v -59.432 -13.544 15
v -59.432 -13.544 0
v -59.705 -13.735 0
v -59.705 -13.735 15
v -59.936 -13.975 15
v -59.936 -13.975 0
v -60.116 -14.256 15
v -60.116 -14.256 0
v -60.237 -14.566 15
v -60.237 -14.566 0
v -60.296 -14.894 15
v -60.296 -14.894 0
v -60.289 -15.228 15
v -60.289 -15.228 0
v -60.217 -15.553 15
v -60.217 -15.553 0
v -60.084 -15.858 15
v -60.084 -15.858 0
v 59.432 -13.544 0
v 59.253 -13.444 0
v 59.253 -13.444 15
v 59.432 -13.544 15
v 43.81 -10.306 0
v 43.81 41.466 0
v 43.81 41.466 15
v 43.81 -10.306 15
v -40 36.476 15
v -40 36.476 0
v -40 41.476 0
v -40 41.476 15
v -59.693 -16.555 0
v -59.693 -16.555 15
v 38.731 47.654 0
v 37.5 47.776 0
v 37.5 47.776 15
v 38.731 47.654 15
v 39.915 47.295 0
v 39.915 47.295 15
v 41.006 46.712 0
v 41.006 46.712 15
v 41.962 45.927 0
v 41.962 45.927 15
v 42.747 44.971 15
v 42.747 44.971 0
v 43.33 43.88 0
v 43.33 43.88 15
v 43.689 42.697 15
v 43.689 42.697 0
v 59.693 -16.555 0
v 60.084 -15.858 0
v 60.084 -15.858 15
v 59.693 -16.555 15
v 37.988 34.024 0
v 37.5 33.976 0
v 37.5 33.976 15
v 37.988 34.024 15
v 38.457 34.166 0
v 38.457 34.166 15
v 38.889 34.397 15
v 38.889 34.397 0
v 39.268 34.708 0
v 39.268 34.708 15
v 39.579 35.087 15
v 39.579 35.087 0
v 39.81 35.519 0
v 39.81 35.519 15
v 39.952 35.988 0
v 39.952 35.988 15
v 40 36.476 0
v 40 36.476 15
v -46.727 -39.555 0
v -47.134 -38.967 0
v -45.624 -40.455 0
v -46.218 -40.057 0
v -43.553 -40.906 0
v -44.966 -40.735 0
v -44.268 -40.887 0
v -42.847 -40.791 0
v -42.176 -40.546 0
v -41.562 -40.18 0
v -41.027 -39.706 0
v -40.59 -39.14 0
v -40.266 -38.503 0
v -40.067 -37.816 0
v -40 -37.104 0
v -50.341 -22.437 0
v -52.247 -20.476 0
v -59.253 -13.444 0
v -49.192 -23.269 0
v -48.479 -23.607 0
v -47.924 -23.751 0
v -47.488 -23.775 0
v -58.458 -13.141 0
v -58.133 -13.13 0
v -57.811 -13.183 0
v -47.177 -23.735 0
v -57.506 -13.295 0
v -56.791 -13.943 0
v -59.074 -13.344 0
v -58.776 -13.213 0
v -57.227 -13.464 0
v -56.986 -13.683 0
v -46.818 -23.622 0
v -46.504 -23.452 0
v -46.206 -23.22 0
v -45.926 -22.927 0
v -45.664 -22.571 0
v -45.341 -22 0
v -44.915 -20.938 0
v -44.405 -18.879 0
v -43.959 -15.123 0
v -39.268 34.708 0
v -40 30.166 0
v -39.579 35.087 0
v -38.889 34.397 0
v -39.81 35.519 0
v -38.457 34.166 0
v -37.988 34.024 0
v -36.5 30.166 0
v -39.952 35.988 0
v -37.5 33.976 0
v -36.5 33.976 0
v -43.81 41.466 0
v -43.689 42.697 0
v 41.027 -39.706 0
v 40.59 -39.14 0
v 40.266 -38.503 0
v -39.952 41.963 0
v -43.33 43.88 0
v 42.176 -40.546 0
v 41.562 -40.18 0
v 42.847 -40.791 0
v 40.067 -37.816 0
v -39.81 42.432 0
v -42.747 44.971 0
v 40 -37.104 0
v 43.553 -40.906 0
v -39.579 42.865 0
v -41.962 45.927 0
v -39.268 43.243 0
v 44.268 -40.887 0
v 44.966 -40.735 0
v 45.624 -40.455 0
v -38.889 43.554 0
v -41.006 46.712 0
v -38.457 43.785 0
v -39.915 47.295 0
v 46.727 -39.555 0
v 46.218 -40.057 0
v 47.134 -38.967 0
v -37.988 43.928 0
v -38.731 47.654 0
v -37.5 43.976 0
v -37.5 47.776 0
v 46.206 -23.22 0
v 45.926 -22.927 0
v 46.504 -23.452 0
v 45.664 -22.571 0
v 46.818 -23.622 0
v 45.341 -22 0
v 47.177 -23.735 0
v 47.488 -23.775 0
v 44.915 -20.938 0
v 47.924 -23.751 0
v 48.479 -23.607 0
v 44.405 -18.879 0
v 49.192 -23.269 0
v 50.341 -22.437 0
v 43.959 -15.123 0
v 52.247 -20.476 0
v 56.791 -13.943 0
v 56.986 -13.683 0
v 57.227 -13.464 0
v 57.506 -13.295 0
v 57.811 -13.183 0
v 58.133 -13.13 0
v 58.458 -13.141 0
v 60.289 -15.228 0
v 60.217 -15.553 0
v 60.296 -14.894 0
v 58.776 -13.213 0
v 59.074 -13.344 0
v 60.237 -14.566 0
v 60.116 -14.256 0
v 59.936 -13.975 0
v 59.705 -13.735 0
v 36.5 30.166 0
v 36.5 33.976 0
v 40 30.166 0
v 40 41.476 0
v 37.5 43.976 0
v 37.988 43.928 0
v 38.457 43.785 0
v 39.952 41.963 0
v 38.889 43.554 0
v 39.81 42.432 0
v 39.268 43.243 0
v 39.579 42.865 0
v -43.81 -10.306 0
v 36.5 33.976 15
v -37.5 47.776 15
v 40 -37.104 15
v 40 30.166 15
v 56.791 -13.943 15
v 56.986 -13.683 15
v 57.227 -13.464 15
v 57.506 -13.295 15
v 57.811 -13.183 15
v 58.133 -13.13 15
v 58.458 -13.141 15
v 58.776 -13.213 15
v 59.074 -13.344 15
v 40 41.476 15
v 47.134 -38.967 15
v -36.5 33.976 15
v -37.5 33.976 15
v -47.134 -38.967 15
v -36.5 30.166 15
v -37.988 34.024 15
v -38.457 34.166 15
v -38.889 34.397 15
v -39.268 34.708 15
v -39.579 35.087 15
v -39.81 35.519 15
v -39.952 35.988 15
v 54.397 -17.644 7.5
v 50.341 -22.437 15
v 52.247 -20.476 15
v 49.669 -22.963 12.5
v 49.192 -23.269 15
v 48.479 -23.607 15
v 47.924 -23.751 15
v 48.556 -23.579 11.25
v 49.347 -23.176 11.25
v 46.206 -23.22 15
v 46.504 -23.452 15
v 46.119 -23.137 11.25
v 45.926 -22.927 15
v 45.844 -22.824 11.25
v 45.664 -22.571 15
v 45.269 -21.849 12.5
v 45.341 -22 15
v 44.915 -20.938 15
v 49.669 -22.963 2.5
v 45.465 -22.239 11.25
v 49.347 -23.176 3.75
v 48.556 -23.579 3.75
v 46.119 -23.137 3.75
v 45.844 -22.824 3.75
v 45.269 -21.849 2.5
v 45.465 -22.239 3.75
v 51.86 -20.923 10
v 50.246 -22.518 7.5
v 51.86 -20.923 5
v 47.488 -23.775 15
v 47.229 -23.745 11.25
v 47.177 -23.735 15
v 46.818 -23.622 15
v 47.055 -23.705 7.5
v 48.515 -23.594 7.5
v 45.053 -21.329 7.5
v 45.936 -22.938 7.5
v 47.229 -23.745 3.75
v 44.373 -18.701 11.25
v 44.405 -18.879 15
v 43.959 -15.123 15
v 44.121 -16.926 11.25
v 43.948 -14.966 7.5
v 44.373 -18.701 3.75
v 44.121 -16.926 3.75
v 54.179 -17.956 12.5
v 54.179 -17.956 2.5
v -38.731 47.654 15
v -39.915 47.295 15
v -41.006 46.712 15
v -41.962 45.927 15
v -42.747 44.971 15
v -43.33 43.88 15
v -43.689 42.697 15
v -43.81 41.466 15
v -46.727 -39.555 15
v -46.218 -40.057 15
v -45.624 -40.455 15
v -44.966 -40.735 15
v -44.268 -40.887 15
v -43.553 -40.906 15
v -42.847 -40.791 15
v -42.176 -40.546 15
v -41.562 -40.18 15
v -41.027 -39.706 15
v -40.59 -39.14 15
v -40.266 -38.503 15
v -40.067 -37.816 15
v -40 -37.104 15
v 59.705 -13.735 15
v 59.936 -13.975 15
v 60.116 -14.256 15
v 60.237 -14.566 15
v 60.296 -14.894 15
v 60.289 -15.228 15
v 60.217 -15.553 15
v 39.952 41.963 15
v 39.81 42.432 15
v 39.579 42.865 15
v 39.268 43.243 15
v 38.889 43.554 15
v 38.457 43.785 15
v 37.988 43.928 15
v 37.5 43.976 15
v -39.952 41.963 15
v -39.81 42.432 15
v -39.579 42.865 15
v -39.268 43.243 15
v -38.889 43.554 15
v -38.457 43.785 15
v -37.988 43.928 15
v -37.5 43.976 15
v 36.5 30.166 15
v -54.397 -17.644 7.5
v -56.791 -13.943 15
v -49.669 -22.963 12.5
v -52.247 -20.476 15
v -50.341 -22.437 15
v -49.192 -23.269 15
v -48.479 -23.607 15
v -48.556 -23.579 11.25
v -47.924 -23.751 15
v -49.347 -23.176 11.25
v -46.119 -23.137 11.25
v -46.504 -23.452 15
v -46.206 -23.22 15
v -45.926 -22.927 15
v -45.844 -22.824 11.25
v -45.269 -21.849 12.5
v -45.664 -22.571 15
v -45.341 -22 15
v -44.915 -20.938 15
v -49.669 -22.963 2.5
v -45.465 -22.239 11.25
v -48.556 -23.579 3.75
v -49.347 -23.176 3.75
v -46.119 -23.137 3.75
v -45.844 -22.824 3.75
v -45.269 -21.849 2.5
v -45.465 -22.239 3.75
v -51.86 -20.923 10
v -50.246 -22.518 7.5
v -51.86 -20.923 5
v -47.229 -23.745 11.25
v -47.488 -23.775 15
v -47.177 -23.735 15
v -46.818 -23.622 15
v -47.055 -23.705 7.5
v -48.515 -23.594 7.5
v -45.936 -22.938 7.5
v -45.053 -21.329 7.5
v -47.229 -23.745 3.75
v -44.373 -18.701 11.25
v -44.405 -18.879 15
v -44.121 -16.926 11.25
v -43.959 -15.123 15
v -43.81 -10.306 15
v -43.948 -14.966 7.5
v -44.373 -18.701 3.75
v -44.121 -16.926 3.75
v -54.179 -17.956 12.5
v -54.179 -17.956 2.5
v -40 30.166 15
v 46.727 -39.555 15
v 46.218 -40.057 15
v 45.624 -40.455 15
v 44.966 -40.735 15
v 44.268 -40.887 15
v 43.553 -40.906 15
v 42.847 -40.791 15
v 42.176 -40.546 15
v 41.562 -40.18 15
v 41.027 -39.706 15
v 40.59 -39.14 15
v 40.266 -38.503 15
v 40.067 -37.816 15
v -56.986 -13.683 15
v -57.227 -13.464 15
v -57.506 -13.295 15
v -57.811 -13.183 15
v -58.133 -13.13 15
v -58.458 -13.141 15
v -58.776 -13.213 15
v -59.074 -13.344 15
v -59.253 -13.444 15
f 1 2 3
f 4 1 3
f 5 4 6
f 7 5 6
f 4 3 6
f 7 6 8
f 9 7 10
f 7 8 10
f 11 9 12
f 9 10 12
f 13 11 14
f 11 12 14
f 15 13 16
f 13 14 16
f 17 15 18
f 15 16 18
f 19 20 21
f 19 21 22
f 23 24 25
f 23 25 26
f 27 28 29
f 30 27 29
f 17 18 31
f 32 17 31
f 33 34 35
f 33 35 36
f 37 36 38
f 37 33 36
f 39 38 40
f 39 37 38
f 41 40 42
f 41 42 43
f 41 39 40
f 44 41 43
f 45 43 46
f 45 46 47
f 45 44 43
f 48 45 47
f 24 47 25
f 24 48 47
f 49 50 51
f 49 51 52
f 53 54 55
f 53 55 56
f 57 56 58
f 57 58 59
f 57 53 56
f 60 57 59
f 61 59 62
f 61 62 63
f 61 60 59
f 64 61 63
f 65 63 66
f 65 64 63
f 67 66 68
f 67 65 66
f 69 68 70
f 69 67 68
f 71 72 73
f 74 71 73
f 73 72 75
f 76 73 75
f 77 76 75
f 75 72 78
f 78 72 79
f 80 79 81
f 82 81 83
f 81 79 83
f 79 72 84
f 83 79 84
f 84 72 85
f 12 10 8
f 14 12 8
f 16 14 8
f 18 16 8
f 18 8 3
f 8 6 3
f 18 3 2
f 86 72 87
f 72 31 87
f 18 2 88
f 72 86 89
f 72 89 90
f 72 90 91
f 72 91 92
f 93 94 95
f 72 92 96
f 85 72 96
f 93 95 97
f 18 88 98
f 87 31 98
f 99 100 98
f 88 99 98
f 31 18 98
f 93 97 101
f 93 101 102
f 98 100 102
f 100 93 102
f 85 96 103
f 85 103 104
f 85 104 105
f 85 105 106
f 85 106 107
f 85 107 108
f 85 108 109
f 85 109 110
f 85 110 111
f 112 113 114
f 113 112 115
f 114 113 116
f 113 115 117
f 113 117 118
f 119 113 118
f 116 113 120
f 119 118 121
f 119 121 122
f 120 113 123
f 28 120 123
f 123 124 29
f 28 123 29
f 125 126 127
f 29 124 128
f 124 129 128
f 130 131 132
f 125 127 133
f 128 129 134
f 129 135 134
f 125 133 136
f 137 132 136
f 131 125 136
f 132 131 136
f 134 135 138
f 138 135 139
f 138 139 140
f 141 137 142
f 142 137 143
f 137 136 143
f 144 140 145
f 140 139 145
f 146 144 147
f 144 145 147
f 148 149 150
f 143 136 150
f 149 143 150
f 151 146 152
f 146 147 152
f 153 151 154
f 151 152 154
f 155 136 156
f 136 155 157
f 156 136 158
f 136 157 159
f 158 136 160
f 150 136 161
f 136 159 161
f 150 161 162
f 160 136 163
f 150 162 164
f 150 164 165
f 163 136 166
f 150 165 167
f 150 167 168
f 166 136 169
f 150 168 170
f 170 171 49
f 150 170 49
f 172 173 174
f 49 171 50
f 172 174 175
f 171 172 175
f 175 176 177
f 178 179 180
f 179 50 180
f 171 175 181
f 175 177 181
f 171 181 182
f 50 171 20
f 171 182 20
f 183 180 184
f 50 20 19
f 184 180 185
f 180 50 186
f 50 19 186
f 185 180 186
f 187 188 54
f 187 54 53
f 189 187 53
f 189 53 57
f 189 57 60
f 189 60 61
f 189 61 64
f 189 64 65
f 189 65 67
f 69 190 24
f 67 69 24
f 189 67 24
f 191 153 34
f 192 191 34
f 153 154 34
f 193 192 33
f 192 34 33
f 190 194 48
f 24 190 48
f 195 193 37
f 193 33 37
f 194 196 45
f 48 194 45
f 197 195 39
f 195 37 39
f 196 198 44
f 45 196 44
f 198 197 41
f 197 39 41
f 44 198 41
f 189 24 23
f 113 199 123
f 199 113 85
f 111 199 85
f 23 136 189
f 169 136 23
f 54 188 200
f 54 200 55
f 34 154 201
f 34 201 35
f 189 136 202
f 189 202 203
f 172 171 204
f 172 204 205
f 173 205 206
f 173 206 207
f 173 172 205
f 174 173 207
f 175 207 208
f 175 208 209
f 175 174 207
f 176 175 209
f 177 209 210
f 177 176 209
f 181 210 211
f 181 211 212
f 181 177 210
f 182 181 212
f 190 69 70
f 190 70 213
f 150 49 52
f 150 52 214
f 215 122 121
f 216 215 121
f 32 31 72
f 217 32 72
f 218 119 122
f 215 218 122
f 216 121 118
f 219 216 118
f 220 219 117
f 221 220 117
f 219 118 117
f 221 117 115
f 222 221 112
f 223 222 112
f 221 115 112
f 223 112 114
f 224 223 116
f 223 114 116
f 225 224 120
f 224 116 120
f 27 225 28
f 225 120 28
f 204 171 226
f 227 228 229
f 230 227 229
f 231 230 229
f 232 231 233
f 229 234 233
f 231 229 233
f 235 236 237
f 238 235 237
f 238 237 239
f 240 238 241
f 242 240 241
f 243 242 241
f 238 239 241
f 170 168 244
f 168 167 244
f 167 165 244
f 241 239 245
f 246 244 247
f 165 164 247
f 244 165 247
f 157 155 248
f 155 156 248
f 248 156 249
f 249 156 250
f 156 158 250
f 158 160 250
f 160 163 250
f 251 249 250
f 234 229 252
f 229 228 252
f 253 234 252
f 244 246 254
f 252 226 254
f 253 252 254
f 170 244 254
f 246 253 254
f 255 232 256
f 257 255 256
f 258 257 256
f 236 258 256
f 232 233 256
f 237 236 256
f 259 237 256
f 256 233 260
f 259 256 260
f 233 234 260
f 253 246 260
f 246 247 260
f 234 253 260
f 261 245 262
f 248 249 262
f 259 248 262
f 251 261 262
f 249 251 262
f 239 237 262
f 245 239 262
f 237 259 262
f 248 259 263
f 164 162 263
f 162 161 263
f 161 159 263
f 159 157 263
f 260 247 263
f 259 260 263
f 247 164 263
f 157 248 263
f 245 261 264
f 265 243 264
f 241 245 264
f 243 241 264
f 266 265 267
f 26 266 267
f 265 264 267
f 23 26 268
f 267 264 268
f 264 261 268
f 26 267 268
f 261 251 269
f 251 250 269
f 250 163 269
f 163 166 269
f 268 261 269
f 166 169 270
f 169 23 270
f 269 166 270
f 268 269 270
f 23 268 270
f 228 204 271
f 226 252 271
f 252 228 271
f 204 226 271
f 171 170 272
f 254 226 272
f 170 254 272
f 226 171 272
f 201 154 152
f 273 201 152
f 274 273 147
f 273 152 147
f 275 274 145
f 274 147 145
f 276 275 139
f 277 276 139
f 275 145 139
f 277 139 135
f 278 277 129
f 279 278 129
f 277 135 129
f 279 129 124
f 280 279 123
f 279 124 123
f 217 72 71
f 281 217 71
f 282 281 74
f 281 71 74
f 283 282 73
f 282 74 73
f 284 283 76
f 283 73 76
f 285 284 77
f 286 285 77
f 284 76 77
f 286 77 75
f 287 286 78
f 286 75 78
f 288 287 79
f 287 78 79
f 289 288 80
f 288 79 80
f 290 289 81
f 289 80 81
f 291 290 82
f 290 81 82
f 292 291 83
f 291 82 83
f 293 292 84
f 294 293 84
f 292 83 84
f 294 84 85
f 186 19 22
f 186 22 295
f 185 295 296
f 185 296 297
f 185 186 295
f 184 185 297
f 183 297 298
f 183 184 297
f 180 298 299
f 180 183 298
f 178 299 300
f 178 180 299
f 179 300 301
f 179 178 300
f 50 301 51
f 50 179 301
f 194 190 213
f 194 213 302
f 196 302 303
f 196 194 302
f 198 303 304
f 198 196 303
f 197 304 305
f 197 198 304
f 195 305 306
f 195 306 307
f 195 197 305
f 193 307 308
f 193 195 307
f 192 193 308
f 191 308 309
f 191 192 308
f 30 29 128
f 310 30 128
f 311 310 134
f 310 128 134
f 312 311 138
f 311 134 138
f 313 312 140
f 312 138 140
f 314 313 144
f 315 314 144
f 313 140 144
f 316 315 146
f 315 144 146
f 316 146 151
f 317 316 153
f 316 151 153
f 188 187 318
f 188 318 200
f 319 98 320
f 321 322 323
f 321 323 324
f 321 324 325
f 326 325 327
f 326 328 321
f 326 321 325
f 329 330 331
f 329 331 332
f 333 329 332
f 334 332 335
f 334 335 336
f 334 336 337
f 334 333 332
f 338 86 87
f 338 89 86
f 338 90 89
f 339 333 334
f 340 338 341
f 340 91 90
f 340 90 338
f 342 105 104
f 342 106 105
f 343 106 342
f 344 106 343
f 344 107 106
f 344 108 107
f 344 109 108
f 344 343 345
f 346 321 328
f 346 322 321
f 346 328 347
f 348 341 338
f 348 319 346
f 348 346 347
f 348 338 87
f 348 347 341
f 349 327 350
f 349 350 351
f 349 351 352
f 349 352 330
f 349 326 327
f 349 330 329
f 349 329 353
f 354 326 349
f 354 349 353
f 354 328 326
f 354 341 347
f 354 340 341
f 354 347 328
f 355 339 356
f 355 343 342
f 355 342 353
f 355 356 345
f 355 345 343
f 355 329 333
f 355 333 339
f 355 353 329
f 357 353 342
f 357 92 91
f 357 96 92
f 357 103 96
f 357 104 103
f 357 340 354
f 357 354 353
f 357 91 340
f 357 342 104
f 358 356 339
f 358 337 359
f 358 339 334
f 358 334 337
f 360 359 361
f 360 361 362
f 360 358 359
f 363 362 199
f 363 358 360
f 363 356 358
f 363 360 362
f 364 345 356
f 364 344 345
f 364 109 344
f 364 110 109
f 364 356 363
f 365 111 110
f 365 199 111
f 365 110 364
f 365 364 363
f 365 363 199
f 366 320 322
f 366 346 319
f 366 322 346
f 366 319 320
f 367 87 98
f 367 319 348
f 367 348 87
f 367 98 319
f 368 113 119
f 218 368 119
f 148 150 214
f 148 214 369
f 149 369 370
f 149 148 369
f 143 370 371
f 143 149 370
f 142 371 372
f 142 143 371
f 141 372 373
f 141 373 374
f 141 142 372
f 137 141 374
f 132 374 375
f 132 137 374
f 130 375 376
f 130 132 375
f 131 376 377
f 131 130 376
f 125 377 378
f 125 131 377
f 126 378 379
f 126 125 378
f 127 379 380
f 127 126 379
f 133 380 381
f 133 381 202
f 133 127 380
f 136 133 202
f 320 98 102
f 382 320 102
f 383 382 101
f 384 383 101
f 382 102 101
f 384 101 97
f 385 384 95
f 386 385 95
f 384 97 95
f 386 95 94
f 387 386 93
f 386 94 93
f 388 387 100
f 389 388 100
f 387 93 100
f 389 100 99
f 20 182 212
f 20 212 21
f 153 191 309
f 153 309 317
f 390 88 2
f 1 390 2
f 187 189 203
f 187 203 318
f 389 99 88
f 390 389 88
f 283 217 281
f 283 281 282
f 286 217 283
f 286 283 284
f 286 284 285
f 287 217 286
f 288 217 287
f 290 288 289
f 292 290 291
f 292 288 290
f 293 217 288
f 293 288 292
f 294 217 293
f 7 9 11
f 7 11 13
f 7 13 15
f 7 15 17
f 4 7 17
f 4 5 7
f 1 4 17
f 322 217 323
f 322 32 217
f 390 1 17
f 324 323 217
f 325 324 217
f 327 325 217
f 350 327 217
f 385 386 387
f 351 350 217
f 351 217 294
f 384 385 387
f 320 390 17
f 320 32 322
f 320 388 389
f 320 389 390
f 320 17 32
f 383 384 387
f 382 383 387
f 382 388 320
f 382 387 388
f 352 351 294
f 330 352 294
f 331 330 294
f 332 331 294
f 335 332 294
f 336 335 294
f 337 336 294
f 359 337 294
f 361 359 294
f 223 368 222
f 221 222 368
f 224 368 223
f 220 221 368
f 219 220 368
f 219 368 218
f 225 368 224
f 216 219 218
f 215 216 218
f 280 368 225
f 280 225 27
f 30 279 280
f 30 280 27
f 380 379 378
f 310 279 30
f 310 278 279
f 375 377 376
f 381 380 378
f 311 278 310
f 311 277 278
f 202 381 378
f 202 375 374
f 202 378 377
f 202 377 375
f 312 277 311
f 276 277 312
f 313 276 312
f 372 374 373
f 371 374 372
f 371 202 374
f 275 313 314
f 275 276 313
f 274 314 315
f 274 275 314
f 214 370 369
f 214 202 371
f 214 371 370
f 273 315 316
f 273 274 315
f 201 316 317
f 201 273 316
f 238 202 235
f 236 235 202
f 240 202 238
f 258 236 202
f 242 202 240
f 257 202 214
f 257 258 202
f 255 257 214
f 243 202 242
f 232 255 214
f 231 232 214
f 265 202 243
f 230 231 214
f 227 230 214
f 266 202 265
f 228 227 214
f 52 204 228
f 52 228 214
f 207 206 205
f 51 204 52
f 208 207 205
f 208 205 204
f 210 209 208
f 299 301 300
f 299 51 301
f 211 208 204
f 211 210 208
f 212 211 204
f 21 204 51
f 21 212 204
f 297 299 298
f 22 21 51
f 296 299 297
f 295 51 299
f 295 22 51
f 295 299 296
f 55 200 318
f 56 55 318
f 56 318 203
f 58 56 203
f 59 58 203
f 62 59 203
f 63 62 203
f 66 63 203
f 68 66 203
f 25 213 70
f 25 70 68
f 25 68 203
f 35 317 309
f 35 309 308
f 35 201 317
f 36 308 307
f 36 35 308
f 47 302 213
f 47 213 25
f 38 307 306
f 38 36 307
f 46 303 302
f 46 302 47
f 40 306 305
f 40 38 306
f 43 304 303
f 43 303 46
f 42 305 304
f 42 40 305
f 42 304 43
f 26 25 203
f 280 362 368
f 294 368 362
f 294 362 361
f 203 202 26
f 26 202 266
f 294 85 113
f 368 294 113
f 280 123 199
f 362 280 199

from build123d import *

# Parameters (mm, degrees)
F1_DEPTH    = 15
F2_T1_DEPTH = 15


# Not quite as in the source:
# - a fillet or chamfer that OpenCascade refuses, or shapes differently, is made with other operations: its cross-section is extruded or revolved along the edge and cut away or added


with BuildPart() as f1:
    # F0 (on Top) → F1 (new body)
    with BuildSketch(Plane.XY):
        with BuildLine():
            ThreePointArc((-40, 41.475575803), (-39.267766953, 43.243342756), (-37.5, 43.975575803))
            Line((-37.5, 43.975575803), (0, 43.975575803))
            Line((0, 43.975575803), (0, 47.775575803))
            Line((0, 47.775575803), (-37.5, 47.775575803))
            ThreePointArc((-37.5, 47.775575803), (-41.9618437893, 45.9274195923), (-43.81, 41.465575803))
            Line((-43.81, 41.465575803), (-43.81, 36.475575803))
            Line((-43.81, 36.475575803), (-43.81, -27.529513372))
            Line((-43.81, -27.529513372), (-43.81, -37.104424197))
            Line((-43.81, -37.104424197), (-48.4908909885, -28.7516895034))
            Line((-48.4908909885, -28.7516895034), (-56.369773679, -14.6923540142))
            Line((-56.369773679, -14.6923540142), (-56.7601447269, -13.9957631722))
            ThreePointArc((-56.7601447269, -13.9957631722), (-57.782169231, -13.1905372922), (-59.0742303685, -13.3438370694))
            Line((-59.0742303685, -13.3438370694), (-59.2530634296, -13.4440555122))
            Line((-59.2530634296, -13.4440555122), (-59.4318964906, -13.5442739549))
            ThreePointArc((-59.4318964906, -13.5442739549), (-60.2371223706, -14.566298459), (-60.0838225934, -15.8583595965))
            Line((-60.0838225934, -15.8583595965), (-59.6934515455, -16.5549504386))
            Line((-59.6934515455, -16.5549504386), (-47.1336778665, -38.9670206213))
            ThreePointArc((-47.1336778665, -38.9670206213), (-42.8474805641, -40.7908393032), (-40, -37.104424197))
            Line((-40, -37.104424197), (-40, 30.165575803))
            Line((-40, 30.165575803), (-37.5, 30.165575803))
            Line((-37.5, 30.165575803), (-36.5, 30.165575803))
            Line((-36.5, 30.165575803), (-36.5, 33.975575803))
            Line((-36.5, 33.975575803), (-37.5, 33.975575803))
            ThreePointArc((-37.5, 33.975575803), (-39.267766953, 34.7078088501), (-40, 36.475575803))
            Line((-40, 36.475575803), (-40, 41.475575803))
        make_face()
    extrude(amount=F1_DEPTH)

    # F2: fillet of radius 7 on 1 edges, made by hand

    # F2_s2 → F2_t1 (join)
    with BuildSketch(Plane.XY):
        with BuildLine():
            add(Edge.make_bspline(
                [(-56.7906958843, -13.9434544078), (-43.81, -35.286127782), (-43.81, -10.30597221)],
                knots=[0, 0, 0, 1, 1, 1], degree=2, weights=[1, 1, 1]))
            Line((-43.81, -10.30597221), (-43.11, -10.30597221))
            Line((-43.11, -10.30597221), (-43.11, -37.104424197))
            Line((-43.11, -37.104424197), (-44.4206494768, -37.4466335138))
            ThreePointArc((-44.4206494768, -37.4466335138), (-57.3707942037, -14.337972489), (-57.3887654728, -14.3072026276))
            Line((-57.3887654728, -14.3072026276), (-56.7906958843, -13.9434544078))
        make_face()
    extrude(amount=F2_T1_DEPTH)

    # F3: F1 across face


with BuildPart() as f1_1:
    add(f1.part)
    add(f1.part.mirror(Plane(origin=(0, 45.875575803, 7.5), x_dir=(0, 1, 0), z_dir=(1, 0, 0))))


solid = f1_1.part
